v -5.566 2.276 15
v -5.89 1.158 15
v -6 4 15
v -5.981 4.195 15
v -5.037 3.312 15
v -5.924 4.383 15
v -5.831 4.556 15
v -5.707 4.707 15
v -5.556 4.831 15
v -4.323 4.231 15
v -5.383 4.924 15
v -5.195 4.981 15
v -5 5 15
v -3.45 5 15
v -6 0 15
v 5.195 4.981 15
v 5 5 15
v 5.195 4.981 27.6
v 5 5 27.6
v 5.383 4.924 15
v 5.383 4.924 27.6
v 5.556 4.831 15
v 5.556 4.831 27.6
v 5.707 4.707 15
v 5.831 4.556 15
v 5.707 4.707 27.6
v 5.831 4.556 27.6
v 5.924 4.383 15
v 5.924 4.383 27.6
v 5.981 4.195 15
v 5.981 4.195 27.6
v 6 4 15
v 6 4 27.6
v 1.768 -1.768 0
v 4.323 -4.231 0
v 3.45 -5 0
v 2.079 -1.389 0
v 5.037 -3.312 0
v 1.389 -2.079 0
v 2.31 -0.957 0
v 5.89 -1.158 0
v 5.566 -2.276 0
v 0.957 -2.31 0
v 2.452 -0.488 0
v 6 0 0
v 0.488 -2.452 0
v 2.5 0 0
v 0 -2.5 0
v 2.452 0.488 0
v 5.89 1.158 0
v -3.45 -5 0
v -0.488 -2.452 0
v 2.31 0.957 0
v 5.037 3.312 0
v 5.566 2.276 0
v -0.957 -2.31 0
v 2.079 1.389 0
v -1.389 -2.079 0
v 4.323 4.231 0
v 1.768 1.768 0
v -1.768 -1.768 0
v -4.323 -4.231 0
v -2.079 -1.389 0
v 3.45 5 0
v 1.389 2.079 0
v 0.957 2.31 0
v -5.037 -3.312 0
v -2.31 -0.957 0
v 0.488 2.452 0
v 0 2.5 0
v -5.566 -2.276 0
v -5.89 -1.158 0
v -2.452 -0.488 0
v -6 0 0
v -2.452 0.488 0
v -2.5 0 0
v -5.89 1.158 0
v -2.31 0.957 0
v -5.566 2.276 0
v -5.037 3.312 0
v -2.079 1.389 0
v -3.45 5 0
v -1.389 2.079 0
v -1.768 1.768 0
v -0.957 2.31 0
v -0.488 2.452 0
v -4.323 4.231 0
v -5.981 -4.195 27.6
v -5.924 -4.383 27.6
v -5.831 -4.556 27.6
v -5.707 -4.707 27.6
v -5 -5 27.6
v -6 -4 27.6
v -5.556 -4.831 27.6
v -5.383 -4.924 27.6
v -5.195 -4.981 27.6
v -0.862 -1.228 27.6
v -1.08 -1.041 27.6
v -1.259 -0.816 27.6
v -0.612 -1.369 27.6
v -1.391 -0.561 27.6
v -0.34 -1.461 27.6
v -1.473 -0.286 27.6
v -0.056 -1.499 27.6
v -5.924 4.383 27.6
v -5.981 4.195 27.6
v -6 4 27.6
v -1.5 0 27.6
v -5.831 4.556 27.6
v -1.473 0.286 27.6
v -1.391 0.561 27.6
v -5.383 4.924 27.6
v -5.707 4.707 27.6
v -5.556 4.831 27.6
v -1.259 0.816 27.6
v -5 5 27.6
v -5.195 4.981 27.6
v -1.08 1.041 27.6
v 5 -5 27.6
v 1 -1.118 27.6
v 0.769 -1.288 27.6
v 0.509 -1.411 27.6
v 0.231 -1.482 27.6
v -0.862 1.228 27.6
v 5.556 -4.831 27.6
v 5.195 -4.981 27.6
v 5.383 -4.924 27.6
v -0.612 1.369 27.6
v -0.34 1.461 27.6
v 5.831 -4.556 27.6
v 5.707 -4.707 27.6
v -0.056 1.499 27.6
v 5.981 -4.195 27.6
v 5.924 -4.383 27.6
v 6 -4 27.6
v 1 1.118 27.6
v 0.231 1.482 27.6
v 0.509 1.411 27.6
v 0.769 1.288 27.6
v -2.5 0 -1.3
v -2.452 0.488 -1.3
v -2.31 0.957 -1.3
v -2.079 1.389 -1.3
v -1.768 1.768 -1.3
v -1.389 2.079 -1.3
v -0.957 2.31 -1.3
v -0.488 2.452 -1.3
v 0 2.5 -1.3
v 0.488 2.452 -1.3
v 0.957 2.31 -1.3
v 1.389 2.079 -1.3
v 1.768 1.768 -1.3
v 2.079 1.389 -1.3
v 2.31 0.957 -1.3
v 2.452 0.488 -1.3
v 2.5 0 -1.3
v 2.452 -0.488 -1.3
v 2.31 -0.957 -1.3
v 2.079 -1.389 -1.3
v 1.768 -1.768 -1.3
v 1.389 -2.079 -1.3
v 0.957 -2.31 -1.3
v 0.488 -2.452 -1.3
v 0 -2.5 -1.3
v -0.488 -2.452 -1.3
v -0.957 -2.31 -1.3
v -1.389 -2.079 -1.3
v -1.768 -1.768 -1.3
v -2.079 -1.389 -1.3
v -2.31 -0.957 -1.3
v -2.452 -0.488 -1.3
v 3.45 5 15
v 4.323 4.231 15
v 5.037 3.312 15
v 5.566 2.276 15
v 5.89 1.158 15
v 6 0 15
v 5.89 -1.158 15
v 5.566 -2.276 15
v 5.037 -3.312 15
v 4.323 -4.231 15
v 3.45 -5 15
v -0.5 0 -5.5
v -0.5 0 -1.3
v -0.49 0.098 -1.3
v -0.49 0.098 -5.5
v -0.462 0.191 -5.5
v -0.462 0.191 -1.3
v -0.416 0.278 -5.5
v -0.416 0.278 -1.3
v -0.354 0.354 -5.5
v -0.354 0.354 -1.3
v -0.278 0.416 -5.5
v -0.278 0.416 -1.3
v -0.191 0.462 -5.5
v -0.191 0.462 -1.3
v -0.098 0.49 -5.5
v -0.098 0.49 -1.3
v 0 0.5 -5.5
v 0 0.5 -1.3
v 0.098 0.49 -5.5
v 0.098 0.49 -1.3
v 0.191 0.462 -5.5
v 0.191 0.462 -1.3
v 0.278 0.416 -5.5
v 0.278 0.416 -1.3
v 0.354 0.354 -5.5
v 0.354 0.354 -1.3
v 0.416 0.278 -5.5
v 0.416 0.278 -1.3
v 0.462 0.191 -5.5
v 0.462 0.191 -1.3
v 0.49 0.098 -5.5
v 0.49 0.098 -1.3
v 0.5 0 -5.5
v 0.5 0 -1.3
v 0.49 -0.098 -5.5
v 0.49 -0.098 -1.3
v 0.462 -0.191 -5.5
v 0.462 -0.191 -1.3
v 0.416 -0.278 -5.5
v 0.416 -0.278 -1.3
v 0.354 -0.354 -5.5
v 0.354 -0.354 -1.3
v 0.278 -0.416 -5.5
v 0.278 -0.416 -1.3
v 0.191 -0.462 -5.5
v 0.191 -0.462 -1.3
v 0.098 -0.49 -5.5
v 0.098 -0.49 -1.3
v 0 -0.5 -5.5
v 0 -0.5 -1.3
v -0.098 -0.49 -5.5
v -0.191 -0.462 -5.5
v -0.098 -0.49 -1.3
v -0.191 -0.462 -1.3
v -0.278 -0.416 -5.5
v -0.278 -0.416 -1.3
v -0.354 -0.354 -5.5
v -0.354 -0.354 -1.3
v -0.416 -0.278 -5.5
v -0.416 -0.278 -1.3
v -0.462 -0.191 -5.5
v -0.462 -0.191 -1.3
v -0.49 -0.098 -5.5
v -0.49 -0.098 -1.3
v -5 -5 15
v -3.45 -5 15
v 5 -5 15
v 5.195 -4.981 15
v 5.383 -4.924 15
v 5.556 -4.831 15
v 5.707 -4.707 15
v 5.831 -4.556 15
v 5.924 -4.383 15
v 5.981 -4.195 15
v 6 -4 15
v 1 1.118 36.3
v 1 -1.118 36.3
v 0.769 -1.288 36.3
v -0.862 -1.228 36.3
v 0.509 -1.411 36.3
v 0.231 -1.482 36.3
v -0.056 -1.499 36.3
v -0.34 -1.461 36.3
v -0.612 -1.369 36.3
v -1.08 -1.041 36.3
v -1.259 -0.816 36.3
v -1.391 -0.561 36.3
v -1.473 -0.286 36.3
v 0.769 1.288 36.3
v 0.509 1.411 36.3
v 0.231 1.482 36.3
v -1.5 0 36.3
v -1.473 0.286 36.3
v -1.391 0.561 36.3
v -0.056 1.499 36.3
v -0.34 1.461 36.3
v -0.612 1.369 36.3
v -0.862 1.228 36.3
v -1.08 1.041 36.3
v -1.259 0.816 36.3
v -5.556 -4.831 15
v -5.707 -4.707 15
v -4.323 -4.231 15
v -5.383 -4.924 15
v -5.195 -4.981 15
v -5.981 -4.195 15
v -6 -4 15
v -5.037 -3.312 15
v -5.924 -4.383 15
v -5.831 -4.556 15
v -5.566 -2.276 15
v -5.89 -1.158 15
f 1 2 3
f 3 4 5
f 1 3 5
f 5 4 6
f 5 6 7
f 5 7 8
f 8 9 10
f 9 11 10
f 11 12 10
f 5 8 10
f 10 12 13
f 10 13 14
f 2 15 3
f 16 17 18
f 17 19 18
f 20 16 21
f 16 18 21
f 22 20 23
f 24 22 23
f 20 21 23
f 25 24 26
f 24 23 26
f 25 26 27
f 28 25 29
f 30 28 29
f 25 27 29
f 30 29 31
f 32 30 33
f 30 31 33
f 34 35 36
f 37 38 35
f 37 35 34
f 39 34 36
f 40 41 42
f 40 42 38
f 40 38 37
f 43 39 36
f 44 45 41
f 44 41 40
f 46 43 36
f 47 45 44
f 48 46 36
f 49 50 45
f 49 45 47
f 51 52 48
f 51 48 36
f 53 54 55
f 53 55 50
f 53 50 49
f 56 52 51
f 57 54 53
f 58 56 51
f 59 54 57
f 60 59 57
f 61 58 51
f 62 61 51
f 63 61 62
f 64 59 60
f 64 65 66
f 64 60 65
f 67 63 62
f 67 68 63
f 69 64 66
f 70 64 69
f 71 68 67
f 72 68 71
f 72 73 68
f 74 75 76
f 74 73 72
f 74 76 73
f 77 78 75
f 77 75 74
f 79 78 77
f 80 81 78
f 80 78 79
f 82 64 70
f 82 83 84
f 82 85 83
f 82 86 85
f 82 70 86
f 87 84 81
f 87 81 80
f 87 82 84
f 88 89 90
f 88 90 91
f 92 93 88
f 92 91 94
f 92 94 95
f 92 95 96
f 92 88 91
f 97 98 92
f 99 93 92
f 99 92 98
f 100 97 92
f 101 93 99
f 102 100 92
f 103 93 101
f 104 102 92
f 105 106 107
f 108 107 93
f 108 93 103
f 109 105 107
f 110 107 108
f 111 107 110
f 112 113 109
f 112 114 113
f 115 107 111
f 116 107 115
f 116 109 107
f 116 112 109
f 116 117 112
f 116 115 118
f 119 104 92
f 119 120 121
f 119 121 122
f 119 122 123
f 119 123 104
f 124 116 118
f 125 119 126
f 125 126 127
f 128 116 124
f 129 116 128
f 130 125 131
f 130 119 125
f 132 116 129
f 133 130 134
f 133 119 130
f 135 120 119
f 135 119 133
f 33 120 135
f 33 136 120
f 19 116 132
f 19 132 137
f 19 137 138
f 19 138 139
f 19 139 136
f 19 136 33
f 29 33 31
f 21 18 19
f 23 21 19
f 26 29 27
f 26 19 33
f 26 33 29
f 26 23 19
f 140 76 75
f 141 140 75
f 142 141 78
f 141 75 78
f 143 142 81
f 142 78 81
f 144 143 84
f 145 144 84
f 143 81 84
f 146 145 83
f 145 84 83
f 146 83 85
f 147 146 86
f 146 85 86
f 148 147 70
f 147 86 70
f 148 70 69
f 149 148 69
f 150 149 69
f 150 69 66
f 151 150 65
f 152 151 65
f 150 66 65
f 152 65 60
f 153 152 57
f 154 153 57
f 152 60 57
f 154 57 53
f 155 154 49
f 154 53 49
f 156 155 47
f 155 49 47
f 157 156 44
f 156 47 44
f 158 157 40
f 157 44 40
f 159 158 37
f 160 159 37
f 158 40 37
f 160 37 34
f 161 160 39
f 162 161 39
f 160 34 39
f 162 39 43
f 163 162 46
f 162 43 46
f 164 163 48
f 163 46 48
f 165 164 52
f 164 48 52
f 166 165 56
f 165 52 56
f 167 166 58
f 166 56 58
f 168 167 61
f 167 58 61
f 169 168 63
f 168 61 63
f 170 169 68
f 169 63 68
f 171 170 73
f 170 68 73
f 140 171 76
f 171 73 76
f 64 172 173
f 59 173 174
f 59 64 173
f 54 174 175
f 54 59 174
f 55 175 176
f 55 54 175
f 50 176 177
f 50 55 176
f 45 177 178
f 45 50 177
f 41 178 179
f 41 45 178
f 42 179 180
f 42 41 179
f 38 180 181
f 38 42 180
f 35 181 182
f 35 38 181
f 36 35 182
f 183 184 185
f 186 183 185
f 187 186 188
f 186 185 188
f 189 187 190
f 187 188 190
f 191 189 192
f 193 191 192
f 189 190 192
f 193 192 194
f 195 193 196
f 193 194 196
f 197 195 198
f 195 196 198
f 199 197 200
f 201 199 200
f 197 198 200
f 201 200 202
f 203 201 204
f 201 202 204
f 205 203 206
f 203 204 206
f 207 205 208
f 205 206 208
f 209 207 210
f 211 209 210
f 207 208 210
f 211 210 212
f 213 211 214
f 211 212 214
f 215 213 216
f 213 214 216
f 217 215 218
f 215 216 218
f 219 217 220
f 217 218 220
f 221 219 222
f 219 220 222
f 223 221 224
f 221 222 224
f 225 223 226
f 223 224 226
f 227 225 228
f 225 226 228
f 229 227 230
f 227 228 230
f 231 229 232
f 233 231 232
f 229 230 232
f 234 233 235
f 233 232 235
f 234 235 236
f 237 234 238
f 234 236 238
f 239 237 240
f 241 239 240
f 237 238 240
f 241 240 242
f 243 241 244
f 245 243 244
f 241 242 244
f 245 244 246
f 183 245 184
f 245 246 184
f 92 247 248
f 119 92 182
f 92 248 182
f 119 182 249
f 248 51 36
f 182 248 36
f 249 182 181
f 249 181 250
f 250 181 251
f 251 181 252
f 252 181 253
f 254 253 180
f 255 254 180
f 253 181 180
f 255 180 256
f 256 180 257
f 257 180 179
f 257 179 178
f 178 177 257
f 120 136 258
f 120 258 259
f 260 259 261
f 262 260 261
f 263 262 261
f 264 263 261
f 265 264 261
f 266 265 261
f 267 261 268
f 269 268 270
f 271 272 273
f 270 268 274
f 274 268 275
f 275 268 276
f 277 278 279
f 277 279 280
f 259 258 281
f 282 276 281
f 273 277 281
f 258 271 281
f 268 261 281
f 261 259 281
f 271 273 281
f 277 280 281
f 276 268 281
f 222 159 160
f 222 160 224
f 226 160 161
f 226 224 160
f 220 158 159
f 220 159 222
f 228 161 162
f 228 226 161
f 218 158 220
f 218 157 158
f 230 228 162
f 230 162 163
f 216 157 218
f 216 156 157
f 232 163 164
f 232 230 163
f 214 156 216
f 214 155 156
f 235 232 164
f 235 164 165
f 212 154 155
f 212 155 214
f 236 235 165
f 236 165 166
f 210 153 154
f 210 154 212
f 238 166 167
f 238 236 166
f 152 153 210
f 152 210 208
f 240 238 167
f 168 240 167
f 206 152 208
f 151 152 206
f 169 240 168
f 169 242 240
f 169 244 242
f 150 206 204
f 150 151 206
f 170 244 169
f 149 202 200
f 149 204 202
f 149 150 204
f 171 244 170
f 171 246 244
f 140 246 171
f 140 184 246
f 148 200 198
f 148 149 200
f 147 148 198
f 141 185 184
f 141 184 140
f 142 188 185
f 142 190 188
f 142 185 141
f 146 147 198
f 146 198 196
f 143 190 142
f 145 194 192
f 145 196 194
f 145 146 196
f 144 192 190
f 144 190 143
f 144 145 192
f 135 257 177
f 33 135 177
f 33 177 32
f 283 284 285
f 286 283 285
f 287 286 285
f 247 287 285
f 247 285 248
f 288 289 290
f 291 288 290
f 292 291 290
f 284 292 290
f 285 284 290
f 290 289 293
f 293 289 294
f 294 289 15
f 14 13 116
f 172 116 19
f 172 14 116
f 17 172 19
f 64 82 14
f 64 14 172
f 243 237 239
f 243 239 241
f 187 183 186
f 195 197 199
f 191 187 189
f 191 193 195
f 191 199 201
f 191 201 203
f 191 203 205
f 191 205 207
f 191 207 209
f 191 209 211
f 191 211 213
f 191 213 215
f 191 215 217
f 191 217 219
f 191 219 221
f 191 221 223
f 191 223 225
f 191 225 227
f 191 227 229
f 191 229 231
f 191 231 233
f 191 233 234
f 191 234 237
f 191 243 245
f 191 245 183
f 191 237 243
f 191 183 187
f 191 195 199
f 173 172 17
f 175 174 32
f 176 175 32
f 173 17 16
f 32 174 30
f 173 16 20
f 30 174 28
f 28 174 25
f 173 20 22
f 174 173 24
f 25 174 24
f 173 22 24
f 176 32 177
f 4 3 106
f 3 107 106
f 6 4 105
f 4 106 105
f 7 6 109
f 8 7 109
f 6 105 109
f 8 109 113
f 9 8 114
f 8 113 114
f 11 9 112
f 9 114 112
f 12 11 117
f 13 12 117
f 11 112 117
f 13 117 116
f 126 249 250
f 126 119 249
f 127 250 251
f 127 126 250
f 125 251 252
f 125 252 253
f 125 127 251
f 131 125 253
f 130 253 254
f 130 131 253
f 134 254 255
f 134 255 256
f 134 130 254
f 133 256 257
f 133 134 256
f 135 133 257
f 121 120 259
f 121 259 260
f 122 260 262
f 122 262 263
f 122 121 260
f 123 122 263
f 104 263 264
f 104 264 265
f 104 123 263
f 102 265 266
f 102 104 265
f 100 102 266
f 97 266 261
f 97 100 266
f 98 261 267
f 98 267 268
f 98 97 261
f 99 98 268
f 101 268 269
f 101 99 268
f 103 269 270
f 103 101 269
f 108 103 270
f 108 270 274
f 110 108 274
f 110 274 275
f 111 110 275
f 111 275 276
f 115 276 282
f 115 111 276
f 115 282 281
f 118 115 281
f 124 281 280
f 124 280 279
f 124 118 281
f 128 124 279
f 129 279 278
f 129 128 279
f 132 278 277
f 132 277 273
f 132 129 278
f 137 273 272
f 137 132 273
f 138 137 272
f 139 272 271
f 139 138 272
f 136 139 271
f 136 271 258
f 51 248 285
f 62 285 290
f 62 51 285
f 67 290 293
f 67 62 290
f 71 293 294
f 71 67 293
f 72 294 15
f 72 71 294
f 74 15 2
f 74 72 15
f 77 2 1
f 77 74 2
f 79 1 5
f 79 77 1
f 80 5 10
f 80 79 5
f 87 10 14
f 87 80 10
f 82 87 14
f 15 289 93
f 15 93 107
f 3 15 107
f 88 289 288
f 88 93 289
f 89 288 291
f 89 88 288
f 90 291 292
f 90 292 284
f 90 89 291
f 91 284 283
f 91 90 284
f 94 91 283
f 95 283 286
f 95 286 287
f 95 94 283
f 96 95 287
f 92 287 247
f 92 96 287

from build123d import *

# Parameters (mm, degrees)
BOSS_EXTRUDE1_DEPTH = 15
SKETCH2_W           = 12
SKETCH2_H           = 10
BOSS_EXTRUDE2_DEPTH = 12.6
FILLET1_R           = 1
BOSS_EXTRUDE3_DEPTH = 8.7
SKETCH4_R           = 2.5
BOSS_EXTRUDE4_DEPTH = 1.3
SKETCH5_R           = 0.5
BOSS_EXTRUDE5_DEPTH = 4.2


with BuildPart() as part:
    # Sketch1 → Boss-Extrude1 (new body)
    with BuildSketch(Plane.XY):
        with BuildLine():
            Line((-3.45, 5), (3.45, 5))
            ThreePointArc((3.45, 5), (6, 0), (3.45, -5))
            Line((3.45, -5), (-3.45, -5))
            ThreePointArc((-3.45, -5), (-6, 0), (-3.45, 5))
        make_face()
    extrude(amount=BOSS_EXTRUDE1_DEPTH)

    # Sketch2 → Boss-Extrude2 (add)
    with BuildSketch(Plane.XY.offset(15)):
        Rectangle(SKETCH2_W, SKETCH2_H)
    extrude(amount=BOSS_EXTRUDE2_DEPTH)

    # Fillet1
    fillet1_edges = [part.edges().sort_by_distance(p)[0] for p in [
        (6, -5, 21.3),
        (6, 5, 21.3),
        (-6, 5, 21.3),
        (-6, -5, 21.3),
    ]]
    fillet(fillet1_edges, radius=FILLET1_R)

    # Sketch3 → Boss-Extrude3 (add)
    with BuildSketch(Plane.XY.offset(27.6)):
        with BuildLine():
            Line((1, 1.118033989), (1, -1.118033989))
            ThreePointArc((1, -1.118033989), (-1.5, 0), (1, 1.118033989))
        make_face()
    extrude(amount=BOSS_EXTRUDE3_DEPTH)

    # Sketch4 → Boss-Extrude4 (add)
    with BuildSketch(Plane(origin=(0, 0, 0), x_dir=(-1, 0, 0), z_dir=(0, 0, -1))):
        Circle(SKETCH4_R)
    extrude(amount=BOSS_EXTRUDE4_DEPTH)

    # Sketch5 → Boss-Extrude5 (add)
    with BuildSketch(Plane(origin=(0, 0, -1.3), x_dir=(-1, 0, 0), z_dir=(0, 0, -1))):
        Circle(SKETCH5_R)
    extrude(amount=BOSS_EXTRUDE5_DEPTH)


solid = part.part
